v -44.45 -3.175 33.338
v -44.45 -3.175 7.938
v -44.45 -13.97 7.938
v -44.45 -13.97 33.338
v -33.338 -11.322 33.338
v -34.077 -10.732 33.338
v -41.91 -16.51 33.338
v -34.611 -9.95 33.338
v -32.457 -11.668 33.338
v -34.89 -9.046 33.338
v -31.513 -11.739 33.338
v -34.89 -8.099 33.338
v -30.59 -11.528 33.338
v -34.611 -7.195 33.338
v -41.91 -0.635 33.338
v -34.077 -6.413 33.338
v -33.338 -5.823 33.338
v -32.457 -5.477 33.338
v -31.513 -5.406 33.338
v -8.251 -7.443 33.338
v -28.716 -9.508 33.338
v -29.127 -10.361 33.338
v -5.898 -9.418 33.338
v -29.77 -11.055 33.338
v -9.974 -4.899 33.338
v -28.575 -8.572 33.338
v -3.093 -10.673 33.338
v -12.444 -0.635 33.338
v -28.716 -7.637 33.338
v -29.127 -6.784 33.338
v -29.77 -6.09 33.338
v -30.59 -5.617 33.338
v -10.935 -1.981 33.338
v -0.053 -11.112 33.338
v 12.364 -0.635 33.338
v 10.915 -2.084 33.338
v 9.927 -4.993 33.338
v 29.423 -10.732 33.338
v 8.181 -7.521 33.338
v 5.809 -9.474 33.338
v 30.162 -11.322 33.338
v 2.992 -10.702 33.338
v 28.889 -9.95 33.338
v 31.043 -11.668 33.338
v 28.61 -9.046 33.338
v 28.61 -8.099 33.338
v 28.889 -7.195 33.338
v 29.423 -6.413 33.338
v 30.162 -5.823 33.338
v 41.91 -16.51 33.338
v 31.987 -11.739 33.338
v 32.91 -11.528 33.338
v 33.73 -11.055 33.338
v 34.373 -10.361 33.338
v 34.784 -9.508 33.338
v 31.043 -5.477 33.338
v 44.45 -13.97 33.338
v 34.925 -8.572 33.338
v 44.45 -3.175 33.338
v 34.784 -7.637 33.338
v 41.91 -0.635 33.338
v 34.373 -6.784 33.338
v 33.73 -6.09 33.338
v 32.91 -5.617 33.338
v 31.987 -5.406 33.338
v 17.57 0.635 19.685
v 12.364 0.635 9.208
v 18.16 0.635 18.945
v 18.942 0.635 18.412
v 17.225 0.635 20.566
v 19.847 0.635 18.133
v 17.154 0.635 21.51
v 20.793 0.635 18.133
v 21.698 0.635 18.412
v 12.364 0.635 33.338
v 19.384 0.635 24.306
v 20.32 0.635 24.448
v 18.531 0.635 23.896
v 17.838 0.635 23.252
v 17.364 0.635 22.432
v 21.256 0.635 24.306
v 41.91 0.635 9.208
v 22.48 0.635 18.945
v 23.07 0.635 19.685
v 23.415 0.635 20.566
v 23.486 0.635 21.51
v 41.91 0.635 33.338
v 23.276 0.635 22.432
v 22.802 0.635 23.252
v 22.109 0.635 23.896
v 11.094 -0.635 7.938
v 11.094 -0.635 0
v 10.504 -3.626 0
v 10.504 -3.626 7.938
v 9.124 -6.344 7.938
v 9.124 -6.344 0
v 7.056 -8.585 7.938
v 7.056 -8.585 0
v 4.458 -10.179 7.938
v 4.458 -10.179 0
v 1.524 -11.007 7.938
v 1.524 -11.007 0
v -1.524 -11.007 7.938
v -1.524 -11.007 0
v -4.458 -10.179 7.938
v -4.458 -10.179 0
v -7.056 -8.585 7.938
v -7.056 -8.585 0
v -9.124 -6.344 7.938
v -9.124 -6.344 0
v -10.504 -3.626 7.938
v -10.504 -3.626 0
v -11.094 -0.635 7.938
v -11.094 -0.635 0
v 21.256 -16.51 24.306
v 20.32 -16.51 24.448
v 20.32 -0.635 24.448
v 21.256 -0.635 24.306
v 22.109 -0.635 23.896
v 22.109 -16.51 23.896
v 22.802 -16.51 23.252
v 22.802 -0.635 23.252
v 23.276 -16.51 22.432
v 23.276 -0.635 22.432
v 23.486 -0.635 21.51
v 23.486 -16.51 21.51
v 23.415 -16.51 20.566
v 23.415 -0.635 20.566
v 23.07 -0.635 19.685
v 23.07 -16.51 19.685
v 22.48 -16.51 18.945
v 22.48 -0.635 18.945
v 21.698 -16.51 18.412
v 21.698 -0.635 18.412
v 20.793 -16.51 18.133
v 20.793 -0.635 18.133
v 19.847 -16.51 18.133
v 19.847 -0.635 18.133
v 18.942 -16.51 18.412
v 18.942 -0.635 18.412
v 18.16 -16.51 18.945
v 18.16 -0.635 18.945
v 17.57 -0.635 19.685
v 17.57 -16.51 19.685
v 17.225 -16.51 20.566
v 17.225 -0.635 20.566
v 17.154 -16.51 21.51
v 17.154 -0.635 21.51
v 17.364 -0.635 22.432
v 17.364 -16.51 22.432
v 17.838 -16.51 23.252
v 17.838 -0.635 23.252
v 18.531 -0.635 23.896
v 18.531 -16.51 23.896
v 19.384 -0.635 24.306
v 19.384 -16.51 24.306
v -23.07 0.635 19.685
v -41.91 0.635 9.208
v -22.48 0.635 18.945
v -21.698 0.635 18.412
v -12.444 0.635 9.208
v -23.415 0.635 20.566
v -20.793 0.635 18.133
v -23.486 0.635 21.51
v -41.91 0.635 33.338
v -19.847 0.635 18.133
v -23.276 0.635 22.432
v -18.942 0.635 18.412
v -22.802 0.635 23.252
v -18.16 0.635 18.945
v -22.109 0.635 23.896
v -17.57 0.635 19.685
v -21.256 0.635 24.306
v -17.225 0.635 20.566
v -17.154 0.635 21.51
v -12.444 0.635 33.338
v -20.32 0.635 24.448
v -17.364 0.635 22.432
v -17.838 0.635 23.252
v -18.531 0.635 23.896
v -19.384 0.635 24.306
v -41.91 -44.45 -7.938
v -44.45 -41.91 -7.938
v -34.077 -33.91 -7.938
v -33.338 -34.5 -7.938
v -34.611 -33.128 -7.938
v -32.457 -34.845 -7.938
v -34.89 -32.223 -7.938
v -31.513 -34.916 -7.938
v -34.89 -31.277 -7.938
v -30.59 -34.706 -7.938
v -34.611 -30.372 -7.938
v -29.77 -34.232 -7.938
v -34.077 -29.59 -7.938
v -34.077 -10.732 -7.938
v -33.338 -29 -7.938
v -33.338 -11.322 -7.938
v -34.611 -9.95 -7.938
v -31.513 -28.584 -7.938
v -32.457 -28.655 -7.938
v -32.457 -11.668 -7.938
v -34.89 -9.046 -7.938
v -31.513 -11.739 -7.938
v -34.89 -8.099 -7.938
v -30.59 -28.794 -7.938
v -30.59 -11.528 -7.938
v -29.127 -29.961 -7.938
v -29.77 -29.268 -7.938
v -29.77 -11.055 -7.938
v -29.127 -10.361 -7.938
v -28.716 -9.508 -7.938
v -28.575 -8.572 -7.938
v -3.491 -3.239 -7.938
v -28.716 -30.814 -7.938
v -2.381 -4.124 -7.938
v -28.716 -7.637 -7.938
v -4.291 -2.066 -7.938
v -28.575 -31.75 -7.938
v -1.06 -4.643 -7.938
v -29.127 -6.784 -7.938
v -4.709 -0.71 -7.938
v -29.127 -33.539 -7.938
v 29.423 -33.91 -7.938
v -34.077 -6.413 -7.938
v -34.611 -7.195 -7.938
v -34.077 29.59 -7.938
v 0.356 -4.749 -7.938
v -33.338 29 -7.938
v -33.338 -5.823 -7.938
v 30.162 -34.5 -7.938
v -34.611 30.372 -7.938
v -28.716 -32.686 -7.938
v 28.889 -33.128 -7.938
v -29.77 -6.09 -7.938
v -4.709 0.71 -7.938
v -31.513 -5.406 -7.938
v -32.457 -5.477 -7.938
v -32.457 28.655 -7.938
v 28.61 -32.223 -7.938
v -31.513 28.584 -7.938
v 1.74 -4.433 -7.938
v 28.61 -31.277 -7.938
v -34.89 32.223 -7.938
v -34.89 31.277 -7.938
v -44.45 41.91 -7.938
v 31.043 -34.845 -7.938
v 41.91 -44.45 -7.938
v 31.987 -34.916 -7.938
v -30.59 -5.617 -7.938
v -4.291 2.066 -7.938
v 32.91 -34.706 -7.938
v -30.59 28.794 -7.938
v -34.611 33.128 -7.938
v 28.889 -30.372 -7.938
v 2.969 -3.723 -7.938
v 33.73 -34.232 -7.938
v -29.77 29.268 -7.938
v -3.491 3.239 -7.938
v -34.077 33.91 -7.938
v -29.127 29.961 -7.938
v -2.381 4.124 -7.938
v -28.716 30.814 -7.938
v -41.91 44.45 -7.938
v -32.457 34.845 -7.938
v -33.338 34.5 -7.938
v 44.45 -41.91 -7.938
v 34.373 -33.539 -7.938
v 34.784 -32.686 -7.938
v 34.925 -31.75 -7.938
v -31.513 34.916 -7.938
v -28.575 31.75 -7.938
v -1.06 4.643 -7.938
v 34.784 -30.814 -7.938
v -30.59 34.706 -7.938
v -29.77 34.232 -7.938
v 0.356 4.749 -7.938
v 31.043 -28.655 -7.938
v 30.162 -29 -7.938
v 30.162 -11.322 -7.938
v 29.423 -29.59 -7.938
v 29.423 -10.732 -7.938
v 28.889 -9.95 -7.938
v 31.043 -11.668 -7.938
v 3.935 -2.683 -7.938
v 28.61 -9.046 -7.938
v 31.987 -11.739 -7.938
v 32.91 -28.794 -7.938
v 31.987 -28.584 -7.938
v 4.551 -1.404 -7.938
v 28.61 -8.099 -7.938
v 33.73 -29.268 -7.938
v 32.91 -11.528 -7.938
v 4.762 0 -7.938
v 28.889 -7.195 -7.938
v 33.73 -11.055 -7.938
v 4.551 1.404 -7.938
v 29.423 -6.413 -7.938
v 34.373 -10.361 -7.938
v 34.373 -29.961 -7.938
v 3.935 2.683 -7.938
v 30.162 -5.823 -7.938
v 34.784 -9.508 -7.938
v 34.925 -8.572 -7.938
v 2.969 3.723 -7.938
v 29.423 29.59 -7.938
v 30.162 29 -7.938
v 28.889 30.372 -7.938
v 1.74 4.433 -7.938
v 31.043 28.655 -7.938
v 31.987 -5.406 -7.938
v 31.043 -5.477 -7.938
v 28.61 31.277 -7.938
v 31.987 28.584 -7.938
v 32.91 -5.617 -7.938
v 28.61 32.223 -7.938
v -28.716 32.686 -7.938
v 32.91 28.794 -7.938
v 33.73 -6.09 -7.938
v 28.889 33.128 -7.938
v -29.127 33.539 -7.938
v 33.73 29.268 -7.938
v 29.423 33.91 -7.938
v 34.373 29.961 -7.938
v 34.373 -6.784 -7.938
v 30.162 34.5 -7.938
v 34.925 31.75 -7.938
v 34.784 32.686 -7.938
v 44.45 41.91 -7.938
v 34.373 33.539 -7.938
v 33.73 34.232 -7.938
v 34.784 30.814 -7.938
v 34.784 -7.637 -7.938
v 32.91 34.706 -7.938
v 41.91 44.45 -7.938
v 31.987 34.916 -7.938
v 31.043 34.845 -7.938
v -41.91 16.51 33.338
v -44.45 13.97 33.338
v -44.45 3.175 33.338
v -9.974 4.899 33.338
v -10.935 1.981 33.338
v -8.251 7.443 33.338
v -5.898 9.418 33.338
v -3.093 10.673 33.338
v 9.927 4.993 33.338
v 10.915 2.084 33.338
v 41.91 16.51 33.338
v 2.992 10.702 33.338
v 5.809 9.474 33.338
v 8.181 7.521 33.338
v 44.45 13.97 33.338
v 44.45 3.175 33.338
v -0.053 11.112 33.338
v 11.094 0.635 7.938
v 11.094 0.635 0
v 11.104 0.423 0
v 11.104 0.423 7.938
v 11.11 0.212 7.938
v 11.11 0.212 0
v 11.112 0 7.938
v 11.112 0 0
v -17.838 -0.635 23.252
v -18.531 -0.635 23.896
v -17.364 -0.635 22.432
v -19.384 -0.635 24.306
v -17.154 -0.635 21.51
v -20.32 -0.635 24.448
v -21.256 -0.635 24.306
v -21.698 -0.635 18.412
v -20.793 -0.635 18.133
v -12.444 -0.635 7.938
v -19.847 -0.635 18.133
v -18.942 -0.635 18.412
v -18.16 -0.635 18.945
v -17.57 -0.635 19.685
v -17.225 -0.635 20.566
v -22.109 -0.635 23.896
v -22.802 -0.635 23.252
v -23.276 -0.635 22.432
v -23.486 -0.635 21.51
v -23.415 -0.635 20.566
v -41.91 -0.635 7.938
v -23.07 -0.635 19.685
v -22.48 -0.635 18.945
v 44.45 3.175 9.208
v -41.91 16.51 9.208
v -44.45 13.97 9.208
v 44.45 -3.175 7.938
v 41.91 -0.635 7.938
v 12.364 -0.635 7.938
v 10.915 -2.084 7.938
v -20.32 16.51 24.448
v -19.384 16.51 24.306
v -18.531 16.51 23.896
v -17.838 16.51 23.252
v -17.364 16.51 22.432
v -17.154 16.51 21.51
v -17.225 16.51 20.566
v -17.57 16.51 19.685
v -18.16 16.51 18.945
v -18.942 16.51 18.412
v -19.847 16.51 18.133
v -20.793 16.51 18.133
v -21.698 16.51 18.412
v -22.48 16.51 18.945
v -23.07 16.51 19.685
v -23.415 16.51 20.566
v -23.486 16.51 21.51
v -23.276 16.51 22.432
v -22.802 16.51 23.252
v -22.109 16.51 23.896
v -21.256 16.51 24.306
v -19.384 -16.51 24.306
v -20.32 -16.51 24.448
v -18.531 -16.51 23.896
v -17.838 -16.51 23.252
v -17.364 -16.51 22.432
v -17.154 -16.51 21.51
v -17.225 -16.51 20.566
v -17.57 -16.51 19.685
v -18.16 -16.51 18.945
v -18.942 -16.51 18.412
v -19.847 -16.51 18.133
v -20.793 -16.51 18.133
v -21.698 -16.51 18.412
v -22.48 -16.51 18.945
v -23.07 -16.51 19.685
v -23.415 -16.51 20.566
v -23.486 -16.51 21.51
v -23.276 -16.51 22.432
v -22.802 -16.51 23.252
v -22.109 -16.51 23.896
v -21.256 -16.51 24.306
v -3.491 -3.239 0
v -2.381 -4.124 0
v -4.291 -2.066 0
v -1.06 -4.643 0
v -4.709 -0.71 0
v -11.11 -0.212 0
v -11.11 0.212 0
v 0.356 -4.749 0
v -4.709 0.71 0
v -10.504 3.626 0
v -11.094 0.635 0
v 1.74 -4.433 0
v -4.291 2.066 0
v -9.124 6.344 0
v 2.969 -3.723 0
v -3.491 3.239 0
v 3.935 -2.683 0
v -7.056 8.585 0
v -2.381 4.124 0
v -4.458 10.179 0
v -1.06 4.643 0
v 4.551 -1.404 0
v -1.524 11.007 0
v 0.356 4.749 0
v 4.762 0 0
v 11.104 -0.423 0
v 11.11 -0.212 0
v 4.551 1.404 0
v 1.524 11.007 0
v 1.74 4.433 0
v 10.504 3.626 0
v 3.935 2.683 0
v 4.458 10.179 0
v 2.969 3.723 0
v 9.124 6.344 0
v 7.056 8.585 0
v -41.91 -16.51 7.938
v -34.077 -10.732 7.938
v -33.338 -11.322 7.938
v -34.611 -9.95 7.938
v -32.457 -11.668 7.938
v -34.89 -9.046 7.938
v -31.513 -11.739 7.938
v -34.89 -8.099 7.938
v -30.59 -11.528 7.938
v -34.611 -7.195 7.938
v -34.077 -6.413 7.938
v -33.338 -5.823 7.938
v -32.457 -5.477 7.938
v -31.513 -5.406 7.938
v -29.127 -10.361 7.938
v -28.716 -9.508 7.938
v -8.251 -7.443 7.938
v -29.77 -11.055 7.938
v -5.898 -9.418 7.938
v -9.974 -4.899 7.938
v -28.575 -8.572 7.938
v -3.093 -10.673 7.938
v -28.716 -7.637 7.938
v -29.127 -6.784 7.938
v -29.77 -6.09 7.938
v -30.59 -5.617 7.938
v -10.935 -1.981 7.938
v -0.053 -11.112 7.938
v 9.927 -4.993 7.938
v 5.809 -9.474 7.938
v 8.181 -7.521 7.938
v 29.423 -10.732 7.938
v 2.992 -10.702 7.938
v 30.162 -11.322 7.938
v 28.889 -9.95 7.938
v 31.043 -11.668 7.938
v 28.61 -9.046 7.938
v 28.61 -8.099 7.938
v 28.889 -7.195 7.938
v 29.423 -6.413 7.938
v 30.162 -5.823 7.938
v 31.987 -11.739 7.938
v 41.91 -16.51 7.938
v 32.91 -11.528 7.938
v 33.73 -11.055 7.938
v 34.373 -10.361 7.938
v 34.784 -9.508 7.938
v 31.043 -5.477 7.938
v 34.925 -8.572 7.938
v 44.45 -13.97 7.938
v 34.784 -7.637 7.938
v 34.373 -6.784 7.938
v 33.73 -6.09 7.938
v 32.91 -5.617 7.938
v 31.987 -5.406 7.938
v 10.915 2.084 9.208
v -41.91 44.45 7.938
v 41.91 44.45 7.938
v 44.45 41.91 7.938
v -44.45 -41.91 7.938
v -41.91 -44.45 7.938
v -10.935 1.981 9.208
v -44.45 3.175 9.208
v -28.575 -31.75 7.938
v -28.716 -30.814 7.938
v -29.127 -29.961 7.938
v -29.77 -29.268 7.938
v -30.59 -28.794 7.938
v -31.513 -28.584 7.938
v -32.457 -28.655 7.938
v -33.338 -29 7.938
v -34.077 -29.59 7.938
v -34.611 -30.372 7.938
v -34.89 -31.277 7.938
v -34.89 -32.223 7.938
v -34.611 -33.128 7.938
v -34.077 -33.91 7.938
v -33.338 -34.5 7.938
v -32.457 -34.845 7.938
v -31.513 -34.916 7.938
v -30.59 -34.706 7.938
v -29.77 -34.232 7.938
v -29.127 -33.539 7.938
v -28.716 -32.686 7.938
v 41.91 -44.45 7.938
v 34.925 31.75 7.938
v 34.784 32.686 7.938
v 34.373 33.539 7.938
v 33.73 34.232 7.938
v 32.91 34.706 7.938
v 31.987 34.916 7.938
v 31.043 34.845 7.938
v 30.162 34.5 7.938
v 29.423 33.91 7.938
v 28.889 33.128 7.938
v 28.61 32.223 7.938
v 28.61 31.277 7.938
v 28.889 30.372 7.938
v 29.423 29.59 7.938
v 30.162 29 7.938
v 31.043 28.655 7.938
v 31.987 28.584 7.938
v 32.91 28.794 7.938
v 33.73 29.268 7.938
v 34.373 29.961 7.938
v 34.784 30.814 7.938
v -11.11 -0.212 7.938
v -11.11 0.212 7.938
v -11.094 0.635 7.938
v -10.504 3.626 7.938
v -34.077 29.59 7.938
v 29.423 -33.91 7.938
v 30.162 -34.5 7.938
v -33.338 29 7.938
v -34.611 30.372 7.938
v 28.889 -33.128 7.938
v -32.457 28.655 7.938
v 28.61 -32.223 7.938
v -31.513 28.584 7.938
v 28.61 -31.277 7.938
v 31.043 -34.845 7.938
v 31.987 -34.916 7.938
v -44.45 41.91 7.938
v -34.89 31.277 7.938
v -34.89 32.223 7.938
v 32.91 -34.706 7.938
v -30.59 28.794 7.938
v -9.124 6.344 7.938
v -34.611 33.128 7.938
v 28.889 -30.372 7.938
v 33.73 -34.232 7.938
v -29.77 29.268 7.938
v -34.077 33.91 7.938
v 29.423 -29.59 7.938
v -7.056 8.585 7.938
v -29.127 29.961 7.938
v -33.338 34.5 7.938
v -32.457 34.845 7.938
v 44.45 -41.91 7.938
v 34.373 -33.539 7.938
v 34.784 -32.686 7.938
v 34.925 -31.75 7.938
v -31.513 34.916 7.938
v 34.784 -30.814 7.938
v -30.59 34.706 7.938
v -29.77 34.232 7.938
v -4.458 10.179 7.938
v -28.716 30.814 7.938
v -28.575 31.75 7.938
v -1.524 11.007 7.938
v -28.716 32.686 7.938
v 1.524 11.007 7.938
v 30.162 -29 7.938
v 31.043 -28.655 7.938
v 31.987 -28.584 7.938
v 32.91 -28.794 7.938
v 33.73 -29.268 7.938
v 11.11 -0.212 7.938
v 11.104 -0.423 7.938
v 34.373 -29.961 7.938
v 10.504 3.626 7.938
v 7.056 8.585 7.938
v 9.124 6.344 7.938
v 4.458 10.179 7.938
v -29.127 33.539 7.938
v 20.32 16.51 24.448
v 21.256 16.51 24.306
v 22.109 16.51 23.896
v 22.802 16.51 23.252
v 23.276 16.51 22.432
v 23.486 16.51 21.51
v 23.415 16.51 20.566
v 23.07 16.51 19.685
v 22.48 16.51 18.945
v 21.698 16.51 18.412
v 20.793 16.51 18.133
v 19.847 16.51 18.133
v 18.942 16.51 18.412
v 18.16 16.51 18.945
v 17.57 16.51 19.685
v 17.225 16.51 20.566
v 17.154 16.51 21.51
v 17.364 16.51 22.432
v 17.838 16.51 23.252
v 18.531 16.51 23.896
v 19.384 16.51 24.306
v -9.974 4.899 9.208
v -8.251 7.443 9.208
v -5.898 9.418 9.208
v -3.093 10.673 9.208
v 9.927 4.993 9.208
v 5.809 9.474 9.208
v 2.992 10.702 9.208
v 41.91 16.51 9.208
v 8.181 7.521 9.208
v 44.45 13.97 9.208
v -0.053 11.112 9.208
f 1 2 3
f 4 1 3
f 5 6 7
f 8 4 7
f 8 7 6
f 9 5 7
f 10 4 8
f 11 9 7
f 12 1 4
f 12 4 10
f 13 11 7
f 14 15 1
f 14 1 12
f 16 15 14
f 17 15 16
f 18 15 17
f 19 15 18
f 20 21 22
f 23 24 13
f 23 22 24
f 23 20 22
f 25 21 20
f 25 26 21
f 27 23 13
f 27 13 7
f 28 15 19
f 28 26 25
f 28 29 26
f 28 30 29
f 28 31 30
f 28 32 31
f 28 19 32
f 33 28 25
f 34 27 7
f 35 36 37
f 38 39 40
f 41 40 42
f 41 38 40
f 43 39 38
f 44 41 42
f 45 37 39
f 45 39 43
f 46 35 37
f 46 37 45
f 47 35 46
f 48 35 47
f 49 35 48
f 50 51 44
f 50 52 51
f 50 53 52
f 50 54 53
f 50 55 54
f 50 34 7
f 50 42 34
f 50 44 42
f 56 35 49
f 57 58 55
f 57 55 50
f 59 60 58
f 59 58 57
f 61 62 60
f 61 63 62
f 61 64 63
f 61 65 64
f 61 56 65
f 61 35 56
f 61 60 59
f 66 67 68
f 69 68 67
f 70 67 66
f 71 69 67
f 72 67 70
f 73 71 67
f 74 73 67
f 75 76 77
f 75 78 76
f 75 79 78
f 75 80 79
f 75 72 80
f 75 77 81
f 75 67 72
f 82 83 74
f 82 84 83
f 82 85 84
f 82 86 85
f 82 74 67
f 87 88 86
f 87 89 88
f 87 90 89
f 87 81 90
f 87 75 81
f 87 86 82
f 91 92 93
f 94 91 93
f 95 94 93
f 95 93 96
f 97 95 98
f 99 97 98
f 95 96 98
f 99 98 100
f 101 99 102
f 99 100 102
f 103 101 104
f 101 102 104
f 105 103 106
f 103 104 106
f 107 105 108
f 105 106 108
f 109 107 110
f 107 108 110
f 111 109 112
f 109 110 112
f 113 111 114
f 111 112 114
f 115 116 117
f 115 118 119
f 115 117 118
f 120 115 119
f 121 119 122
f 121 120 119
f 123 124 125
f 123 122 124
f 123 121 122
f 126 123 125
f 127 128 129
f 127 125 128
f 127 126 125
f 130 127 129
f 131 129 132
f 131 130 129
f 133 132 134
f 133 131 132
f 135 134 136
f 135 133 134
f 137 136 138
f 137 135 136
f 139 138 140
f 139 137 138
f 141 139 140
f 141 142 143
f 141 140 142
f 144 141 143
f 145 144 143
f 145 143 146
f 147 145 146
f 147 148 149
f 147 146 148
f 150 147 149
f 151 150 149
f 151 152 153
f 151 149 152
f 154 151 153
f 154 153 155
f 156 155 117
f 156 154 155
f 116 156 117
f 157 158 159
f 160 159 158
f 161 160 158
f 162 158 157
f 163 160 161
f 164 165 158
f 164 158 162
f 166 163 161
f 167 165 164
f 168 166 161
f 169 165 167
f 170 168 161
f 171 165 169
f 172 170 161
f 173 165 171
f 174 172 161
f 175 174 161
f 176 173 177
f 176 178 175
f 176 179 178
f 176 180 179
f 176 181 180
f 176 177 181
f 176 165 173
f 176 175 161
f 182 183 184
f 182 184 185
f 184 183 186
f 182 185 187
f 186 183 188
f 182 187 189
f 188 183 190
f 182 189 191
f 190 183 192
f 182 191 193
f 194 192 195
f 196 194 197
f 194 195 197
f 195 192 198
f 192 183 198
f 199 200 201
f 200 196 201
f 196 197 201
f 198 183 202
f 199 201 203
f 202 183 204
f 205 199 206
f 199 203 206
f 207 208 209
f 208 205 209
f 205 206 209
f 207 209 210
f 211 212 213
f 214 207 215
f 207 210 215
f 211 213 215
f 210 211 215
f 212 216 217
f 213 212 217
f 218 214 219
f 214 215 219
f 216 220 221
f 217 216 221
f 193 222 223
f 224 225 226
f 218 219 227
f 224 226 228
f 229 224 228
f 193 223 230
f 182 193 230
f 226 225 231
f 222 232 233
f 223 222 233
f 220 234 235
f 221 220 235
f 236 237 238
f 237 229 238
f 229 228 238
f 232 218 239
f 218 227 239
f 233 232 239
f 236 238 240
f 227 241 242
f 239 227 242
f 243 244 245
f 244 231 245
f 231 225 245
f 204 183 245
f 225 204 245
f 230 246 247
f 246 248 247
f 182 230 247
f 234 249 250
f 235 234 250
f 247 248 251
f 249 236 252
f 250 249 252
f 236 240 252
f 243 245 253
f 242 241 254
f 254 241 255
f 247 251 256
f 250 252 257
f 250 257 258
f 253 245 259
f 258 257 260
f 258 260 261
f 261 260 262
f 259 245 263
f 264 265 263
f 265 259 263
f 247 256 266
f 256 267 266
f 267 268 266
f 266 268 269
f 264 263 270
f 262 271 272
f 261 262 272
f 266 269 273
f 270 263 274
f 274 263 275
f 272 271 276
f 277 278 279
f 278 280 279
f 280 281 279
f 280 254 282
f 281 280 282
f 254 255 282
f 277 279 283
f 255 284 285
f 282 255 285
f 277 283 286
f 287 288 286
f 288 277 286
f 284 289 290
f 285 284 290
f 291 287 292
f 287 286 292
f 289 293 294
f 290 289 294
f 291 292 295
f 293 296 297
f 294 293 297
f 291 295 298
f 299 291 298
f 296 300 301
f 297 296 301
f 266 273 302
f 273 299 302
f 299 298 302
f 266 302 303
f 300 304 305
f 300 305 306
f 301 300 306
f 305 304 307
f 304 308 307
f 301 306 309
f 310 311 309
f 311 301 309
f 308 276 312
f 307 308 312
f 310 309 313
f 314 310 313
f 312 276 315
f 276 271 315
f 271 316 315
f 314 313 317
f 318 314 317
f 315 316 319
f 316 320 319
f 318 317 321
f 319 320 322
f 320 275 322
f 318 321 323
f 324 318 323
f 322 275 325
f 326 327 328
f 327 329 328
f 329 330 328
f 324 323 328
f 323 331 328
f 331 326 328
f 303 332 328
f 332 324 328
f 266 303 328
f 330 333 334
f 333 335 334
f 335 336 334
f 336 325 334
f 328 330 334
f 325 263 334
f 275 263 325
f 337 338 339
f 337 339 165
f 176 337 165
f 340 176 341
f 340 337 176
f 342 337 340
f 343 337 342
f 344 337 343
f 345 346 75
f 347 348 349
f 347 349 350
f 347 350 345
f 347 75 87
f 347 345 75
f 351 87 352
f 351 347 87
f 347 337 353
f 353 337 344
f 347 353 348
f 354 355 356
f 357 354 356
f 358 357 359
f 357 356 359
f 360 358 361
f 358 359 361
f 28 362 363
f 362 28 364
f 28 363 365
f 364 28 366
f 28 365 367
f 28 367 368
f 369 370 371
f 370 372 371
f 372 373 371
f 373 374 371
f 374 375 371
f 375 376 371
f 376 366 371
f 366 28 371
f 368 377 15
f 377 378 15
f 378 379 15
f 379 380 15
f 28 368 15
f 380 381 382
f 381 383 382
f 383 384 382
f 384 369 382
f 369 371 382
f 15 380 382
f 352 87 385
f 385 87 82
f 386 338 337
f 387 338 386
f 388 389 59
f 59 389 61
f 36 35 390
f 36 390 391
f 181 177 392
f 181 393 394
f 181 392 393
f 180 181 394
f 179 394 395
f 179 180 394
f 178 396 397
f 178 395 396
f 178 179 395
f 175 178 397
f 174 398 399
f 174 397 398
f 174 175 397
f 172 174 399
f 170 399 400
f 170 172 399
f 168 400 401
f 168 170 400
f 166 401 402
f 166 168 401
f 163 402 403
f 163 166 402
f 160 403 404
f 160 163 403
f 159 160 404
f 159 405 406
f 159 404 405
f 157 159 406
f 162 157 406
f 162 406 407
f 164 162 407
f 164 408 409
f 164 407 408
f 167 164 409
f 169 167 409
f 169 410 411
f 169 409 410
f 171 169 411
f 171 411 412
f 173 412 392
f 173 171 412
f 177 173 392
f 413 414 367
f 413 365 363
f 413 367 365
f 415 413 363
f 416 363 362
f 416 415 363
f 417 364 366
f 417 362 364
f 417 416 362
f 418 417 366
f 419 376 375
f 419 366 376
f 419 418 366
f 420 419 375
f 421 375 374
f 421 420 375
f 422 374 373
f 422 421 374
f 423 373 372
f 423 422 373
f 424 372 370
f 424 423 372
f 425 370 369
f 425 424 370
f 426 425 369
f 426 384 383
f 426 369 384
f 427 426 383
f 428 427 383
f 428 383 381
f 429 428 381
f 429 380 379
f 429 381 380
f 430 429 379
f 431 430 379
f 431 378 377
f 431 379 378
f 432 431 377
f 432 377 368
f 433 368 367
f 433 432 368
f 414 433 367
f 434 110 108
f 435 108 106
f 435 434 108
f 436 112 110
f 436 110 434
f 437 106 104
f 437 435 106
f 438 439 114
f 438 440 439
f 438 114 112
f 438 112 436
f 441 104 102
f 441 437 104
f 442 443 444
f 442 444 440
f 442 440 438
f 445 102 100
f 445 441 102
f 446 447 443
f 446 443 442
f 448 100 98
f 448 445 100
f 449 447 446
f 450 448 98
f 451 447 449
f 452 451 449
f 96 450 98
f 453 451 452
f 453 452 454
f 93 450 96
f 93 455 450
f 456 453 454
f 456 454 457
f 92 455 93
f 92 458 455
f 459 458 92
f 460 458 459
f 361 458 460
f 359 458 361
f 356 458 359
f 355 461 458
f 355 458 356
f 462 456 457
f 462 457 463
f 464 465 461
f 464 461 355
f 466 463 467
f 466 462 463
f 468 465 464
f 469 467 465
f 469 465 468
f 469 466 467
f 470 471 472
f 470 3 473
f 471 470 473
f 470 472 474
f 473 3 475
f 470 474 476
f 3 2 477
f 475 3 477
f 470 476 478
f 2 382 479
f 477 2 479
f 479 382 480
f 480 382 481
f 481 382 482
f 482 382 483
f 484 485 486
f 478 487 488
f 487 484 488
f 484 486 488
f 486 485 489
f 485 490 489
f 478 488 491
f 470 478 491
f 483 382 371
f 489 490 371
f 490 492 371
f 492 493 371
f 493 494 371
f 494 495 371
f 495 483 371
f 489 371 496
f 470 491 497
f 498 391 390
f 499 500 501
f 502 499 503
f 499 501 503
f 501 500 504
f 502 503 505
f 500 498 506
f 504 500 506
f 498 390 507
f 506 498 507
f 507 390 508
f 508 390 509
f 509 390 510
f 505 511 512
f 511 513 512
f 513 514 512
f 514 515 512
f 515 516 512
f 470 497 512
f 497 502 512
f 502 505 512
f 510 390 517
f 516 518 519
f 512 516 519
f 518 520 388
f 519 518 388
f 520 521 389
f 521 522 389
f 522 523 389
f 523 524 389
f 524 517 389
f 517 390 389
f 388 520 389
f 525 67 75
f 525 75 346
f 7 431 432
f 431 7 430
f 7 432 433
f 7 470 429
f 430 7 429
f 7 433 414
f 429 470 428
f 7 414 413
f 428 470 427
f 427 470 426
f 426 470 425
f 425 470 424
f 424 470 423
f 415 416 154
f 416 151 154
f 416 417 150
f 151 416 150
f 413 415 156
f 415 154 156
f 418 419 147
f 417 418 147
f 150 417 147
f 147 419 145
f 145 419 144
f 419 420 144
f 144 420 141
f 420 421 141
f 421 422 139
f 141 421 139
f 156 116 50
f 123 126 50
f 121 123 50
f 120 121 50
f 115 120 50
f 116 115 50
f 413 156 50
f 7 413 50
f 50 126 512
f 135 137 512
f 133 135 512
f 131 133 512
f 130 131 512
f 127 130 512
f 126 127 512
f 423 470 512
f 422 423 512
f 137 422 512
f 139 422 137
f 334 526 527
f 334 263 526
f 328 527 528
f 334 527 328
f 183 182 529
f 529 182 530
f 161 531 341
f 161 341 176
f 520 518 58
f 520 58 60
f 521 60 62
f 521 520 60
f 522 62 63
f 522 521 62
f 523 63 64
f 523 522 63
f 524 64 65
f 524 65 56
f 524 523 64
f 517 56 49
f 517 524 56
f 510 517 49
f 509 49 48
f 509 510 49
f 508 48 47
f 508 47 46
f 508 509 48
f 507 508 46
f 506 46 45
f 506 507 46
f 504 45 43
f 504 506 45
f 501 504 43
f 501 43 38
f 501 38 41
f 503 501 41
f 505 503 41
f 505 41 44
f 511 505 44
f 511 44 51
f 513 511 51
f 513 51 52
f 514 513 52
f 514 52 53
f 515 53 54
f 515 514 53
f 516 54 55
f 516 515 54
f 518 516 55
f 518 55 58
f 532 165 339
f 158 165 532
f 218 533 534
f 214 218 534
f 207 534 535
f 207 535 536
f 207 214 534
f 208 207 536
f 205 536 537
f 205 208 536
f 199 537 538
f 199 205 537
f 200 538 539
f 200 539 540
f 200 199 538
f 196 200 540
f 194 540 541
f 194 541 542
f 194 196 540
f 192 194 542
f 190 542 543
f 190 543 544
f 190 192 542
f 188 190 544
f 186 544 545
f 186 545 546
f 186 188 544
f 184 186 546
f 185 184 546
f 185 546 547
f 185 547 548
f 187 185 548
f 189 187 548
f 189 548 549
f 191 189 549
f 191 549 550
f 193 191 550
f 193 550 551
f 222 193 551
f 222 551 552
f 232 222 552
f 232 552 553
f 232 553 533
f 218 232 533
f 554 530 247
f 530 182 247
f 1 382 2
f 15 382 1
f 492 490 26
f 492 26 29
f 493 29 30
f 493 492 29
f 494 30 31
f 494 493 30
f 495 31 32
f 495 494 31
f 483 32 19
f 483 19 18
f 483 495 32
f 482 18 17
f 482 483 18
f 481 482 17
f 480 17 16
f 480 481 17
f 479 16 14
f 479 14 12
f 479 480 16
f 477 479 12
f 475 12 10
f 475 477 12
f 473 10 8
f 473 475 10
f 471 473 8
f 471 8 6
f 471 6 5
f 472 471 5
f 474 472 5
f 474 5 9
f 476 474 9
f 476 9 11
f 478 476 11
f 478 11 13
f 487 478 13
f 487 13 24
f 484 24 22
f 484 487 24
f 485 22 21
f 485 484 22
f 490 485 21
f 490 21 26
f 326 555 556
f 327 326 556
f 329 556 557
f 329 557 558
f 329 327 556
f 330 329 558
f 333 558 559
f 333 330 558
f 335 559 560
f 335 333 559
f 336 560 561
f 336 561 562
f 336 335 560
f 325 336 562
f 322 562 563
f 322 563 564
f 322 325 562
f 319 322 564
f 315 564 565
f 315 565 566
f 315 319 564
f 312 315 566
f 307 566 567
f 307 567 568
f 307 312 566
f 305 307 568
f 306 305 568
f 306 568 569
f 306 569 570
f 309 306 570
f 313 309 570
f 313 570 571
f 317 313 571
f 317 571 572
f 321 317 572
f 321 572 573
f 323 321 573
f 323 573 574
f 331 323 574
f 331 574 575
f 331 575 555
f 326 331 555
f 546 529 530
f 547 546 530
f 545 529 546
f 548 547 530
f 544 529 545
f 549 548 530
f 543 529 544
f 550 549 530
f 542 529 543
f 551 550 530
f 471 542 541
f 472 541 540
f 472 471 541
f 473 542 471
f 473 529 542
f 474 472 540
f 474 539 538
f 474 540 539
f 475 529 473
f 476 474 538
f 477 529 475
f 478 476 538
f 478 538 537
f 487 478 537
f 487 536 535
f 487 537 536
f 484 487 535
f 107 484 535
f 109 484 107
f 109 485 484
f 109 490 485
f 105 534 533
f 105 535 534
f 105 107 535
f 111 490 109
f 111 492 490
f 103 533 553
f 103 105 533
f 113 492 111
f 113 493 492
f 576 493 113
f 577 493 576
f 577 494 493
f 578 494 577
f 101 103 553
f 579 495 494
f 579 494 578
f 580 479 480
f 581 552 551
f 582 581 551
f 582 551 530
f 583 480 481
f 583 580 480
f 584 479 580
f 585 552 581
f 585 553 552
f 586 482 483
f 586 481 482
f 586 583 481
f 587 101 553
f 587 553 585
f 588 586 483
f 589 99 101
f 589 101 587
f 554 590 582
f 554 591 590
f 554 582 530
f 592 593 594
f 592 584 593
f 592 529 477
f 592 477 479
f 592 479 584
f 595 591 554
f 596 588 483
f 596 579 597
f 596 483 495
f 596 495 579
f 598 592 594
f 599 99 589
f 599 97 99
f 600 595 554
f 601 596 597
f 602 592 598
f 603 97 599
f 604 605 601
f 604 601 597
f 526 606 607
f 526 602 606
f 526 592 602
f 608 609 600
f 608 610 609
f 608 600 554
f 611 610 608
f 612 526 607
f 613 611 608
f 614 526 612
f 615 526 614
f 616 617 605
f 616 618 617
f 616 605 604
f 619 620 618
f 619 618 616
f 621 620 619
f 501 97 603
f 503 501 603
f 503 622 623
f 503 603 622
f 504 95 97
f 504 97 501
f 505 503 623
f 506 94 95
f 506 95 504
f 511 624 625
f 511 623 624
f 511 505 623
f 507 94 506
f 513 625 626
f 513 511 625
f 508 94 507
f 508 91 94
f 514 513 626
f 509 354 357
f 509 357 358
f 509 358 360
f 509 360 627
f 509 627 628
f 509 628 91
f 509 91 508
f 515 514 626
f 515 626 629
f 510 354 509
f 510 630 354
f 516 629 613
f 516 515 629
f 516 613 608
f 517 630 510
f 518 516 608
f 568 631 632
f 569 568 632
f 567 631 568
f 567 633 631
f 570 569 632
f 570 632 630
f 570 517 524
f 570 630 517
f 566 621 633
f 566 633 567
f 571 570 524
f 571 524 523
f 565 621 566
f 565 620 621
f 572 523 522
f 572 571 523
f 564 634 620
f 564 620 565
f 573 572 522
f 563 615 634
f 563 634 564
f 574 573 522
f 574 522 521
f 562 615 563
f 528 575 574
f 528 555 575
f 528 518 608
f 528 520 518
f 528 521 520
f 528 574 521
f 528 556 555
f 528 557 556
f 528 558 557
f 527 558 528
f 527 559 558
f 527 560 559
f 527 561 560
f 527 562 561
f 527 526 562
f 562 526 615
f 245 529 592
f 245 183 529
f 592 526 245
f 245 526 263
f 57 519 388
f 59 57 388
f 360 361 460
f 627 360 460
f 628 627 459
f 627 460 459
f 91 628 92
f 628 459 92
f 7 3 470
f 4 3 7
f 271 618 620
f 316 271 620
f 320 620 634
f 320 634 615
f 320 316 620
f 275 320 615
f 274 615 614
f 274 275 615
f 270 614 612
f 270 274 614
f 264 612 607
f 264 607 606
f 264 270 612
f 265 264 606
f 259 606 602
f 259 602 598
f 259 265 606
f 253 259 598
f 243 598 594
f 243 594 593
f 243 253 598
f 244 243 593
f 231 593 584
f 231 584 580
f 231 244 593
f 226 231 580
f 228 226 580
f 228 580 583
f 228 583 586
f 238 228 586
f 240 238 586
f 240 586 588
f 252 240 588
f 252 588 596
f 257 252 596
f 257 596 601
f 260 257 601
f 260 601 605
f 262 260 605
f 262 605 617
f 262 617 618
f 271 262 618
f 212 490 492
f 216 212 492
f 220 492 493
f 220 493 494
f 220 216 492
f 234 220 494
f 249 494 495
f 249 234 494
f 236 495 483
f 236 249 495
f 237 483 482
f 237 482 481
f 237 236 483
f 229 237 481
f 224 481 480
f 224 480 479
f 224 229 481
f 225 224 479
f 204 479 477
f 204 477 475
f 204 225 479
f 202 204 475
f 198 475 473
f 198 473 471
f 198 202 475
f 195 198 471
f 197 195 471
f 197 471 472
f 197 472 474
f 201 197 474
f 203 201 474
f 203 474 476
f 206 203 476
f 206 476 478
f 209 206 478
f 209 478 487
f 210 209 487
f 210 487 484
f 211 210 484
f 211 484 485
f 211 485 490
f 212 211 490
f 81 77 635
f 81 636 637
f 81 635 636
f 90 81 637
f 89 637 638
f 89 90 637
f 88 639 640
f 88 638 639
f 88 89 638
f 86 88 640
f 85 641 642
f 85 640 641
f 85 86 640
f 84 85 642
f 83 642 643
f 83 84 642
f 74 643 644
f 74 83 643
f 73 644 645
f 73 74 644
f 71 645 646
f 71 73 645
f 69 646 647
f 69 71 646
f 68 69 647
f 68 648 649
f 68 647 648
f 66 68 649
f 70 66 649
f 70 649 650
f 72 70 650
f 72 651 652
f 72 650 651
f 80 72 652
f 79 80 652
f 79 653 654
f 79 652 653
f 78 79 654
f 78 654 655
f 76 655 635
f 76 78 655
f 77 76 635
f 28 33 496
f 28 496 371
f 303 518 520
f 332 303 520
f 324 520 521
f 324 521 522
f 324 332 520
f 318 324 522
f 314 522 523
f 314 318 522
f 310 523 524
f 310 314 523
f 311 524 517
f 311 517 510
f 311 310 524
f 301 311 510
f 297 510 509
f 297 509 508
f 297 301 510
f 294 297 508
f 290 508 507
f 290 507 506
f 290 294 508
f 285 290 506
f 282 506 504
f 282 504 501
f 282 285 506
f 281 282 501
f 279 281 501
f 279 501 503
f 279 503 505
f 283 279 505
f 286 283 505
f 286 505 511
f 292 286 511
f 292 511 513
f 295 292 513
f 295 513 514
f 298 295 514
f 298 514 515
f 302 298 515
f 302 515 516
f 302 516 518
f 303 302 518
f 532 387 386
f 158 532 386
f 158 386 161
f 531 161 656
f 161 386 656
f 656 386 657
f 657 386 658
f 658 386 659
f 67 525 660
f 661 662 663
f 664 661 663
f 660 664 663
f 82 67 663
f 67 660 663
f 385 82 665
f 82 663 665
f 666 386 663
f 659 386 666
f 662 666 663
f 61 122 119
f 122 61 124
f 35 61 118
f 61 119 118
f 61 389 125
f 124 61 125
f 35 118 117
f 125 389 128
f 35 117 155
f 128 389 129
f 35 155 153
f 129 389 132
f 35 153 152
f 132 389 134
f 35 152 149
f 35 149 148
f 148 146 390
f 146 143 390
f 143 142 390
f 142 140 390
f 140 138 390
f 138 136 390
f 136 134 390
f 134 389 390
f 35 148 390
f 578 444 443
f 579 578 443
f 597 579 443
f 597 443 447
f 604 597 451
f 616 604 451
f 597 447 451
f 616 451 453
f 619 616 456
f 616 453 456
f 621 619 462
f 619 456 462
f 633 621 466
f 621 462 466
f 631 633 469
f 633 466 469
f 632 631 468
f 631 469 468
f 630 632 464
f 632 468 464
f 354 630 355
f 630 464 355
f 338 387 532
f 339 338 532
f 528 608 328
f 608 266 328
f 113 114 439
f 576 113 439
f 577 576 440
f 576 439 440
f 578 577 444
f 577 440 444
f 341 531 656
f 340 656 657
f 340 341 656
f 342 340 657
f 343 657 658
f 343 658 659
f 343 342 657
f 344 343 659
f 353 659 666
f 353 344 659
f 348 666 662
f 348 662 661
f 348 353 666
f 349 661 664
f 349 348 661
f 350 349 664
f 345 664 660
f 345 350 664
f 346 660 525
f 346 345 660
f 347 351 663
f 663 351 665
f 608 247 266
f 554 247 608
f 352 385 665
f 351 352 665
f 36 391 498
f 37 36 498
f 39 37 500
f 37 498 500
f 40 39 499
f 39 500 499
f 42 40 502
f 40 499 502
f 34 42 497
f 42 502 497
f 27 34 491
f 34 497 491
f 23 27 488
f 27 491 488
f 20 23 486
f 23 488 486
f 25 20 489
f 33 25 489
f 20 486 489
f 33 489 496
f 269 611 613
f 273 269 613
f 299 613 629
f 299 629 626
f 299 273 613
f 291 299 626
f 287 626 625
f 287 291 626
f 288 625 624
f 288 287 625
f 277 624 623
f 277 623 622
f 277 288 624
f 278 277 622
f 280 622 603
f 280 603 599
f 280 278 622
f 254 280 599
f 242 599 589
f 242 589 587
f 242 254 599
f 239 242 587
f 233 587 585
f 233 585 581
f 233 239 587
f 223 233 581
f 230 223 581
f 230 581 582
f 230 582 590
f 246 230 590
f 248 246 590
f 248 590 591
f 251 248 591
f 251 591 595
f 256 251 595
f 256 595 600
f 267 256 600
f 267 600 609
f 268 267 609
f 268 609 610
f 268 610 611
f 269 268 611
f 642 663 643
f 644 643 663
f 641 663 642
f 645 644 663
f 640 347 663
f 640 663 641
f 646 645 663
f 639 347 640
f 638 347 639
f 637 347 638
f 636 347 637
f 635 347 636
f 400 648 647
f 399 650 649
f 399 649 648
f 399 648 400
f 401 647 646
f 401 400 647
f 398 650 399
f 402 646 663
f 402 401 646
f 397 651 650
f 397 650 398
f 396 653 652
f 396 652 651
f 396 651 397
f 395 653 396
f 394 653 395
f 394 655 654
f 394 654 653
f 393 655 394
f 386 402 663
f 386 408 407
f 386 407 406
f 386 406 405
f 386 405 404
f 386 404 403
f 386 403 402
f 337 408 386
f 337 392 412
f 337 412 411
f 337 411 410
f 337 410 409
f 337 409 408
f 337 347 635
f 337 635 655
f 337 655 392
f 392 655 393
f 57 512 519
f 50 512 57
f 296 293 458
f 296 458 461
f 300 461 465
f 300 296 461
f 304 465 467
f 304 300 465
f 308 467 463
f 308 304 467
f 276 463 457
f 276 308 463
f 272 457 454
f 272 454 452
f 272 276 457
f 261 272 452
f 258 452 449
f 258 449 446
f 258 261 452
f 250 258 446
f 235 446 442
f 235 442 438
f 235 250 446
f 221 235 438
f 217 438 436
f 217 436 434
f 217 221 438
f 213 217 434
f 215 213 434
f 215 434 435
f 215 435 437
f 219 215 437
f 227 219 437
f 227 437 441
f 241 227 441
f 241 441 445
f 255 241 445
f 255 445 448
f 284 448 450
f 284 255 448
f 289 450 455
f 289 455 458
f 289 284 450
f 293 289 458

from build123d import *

# Parameters (mm, degrees)
SKETCH1_W               = 88.9
SKETCH1_H               = 27.94
SKETCH1_R               = 3.175
BOSS_EXTRUDE1_DEPTH     = 7.9375
BOSS_EXTRUDE2_START     = 7.9375
SKETCH1_3_R             = 3.175
BOSS_EXTRUDE2_DEPTH     = 25.4
BOSS_EXTRUDE3_START     = 33.3375
BOSS_EXTRUDE3_DEPTH     = 24.13
CUT_EXTRUDE1_DEPTH      = 72.154718088
CUT_EXTRUDE1_DEPTH_BACK = 72.154718088
SKETCH2_R               = 3.175
BOSS_EXTRUDE4_START     = -7.9375
SKETCH1_5_W             = 88.9
SKETCH1_5_H             = 88.9
SKETCH1_5_R             = 3.175
SKETCH1_5_R_2           = 4.7625
BOSS_EXTRUDE4_DEPTH     = 7.9375
CHAMFER1_SIZE           = 2.54
CHAMFER2_SIZE           = 2.54
CHAMFER3_SIZE           = 2.54
CHAMFER4_SIZE           = 1.349308072
CHAMFER4_SIZE_2         = 1.27
CHAMFER5_SIZE           = 1.349308072
CHAMFER5_SIZE_2         = 1.27


with BuildPart() as part:
    # Sketch1 → Boss-Extrude1 (new body)
    # profile 1 of 6: a face of its own
    with BuildSketch(Plane.XY):
        with Locations((0, 30.48)):
            Rectangle(SKETCH1_W, SKETCH1_H)
        with Locations((-31.75, 31.75)):
            Circle(SKETCH1_R, mode=Mode.SUBTRACT)
        with Locations((31.75, 31.75)):
            Circle(SKETCH1_R, mode=Mode.SUBTRACT)
    # profile 2 of 6: a face of its own
    with BuildSketch(Plane.XY):
        with BuildLine():
            Line((44.45, 16.51), (-44.45, 16.51))
            Line((-44.45, 16.51), (-44.45, 0.635))
            Line((-44.45, 0.635), (-11.094342308, 0.635))
            ThreePointArc((-11.094342308, 0.635), (0, 11.1125), (11.094342308, 0.635))
            Line((11.094342308, 0.635), (44.45, 0.635))
            Line((44.45, 0.635), (44.45, 16.51))
        make_face()
    # profile 3 of 6: a face of its own
    with BuildSketch(Plane.XY):
        with BuildLine():
            Line((44.45, -16.51), (44.45, -0.635))
            Line((44.45, -0.635), (11.094342308, -0.635))
            ThreePointArc((11.094342308, -0.635), (0, -11.1125), (-11.094342308, -0.635))
            Line((-11.094342308, -0.635), (-44.45, -0.635))
            Line((-44.45, -0.635), (-44.45, -16.51))
            Line((-44.45, -16.51), (44.45, -16.51))
        make_face()
        with Locations((-31.75, -8.5725)):
            Circle(SKETCH1_R, mode=Mode.SUBTRACT)
        with Locations((31.75, -8.5725)):
            Circle(SKETCH1_R, mode=Mode.SUBTRACT)
    # profile 4 of 6: a face of its own
    with BuildSketch(Plane.XY):
        with Locations((0, -30.48)):
            Rectangle(SKETCH1_W, SKETCH1_H)
        with Locations((-31.75, -31.75)):
            Circle(SKETCH1_R, mode=Mode.SUBTRACT)
        with Locations((31.75, -31.75)):
            Circle(SKETCH1_R, mode=Mode.SUBTRACT)
    # profile 5 of 6: a face of its own
    with BuildSketch(Plane.XY):
        with BuildLine():
            Line((-11.094342308, 0.635), (-44.45, 0.635))
            Line((-44.45, 0.635), (-44.45, 0))
            Line((-44.45, 0), (-44.45, -0.635))
            Line((-44.45, -0.635), (-11.094342308, -0.635))
            ThreePointArc((-11.094342308, -0.635), (-11.1125, 0), (-11.094342308, 0.635))
        make_face()
    # profile 6 of 6: a face of its own
    with BuildSketch(Plane.XY):
        with BuildLine():
            Line((44.45, -0.635), (44.45, 0.635))
            Line((44.45, 0.635), (11.094342308, 0.635))
            ThreePointArc((11.094342308, 0.635), (11.107959649, 0.317629777), (11.1125, 0))
            ThreePointArc((11.1125, 0), (11.107959649, -0.317629777), (11.094342308, -0.635))
            Line((11.094342308, -0.635), (44.45, -0.635))
        make_face()
    extrude(amount=BOSS_EXTRUDE1_DEPTH)

    # Sketch1<5> → Boss-Extrude4 (add)
    with BuildSketch(Plane.XY.offset(BOSS_EXTRUDE4_START)):
        Rectangle(SKETCH1_5_W, SKETCH1_5_H)
        with Locations((-31.75, 31.75)):
            Circle(SKETCH1_5_R, mode=Mode.SUBTRACT)
        with Locations((31.75, 31.75)):
            Circle(SKETCH1_5_R, mode=Mode.SUBTRACT)
        Circle(SKETCH1_5_R_2, mode=Mode.SUBTRACT)
        with Locations((31.75, -8.5725)):
            Circle(SKETCH1_5_R, mode=Mode.SUBTRACT)
        with Locations((-31.75, -8.5725)):
            Circle(SKETCH1_5_R, mode=Mode.SUBTRACT)
        with Locations((31.75, -31.75)):
            Circle(SKETCH1_5_R, mode=Mode.SUBTRACT)
        with Locations((-31.75, -31.75)):
            Circle(SKETCH1_5_R, mode=Mode.SUBTRACT)
    extrude(amount=BOSS_EXTRUDE4_DEPTH)

    # Chamfer1
    chamfer1_edges = [part.edges().sort_by_distance(p)[0] for p in [
        (-44.45, -44.45, 0),
        (-44.45, 44.45, 0),
        (44.45, 44.45, 0),
        (44.45, -44.45, 0),
    ]]
    chamfer(chamfer1_edges, length=CHAMFER1_SIZE)


with BuildPart() as body_2:
    # Sketch1<3> → Boss-Extrude2 (new body)
    with BuildSketch(Plane.XY.offset(BOSS_EXTRUDE2_START)):
        with BuildLine():
            Line((44.45, -16.51), (44.45, -0.635))
            Line((44.45, -0.635), (11.094342308, -0.635))
            ThreePointArc((11.094342308, -0.635), (0, -11.1125), (-11.094342308, -0.635))
            Line((-11.094342308, -0.635), (-44.45, -0.635))
            Line((-44.45, -0.635), (-44.45, -16.51))
            Line((-44.45, -16.51), (44.45, -16.51))
        make_face()
        with Locations((-31.75, -8.5725)):
            Circle(SKETCH1_3_R, mode=Mode.SUBTRACT)
        with Locations((31.75, -8.5725)):
            Circle(SKETCH1_3_R, mode=Mode.SUBTRACT)
    extrude(amount=BOSS_EXTRUDE2_DEPTH)


with BuildPart() as body_3:
    # Sketch1<4> → Boss-Extrude3 (new body)
    with BuildSketch(Plane.XY.offset(BOSS_EXTRUDE3_START)):
        with BuildLine():
            Line((44.45, 16.51), (-44.45, 16.51))
            Line((-44.45, 16.51), (-44.45, 0.635))
            Line((-44.45, 0.635), (-11.094342308, 0.635))
            ThreePointArc((-11.094342308, 0.635), (0, 11.1125), (11.094342308, 0.635))
            Line((11.094342308, 0.635), (44.45, 0.635))
            Line((44.45, 0.635), (44.45, 16.51))
        make_face()
    extrude(amount=-BOSS_EXTRUDE3_DEPTH)


with BuildPart() as cut_extrude1_tool:
    # Sketch2 → Cut-Extrude1 (new, two sides: drawn at the far end of the back side and taken through both)
    with BuildSketch(Plane(origin=(0, 0, 0), x_dir=(1, 0, 0), z_dir=(0, 1, 0)).offset(-CUT_EXTRUDE1_DEPTH_BACK)):
        with Locations(Location((20.32, -21.2725, 0), (0, 0, 270))):
            Circle(SKETCH2_R)
        with Locations(Location((-20.32, -21.2725, 0), (0, 0, 270))):
            Circle(SKETCH2_R)
    extrude(amount=CUT_EXTRUDE1_DEPTH + CUT_EXTRUDE1_DEPTH_BACK)


with BuildPart() as body_2_1:
    add(body_2.part)

    # Cut-Extrude1: cut by cut_extrude1_tool
    add(cut_extrude1_tool.part, mode=Mode.SUBTRACT)

    # Chamfer2
    chamfer2_edges = [body_2_1.edges().sort_by_distance(p)[0] for p in [
        (44.45, -16.51, 20.6375),
        (-44.45, -16.51, 20.6375),
        (-44.45, -0.635, 20.6375),
        (44.45, -0.635, 20.6375),
    ]]
    chamfer(chamfer2_edges, length=CHAMFER2_SIZE)

    # Chamfer4
    # the kernel refuses this chamfer: 1.349308072, 1.27 mm, written as the material it takes off along each edge
    with BuildSketch(Plane(origin=(-11.094342308, -0.635, 4.44742728), x_dir=(0.11791105976871491, -0.9930241598189938, 0), z_dir=(0, 0, 1))) as chamfer4_piece_1:
        with BuildLine():
            Line((1.355150635, 0), (-CHAMFER4_SIZE * 0.117911059734, -CHAMFER4_SIZE * 0.993024159525))
            Line((-CHAMFER4_SIZE * 0.117911059734, -CHAMFER4_SIZE * 0.993024159525), (0, 0))
            ThreePointArc((0, 0), (0.697855763, -0.020658022), (1.355150635, 0))
        make_face()
    extrude(amount=32.38014544, mode=Mode.SUBTRACT)
    with BuildSketch(Plane(origin=(11.094342308, -0.635, 4.180143516), x_dir=(1, 0, 0), z_dir=(0, 0, 1))) as chamfer4_piece_2:
        with BuildLine():
            Line((CHAMFER4_SIZE_2, 0), (-0.179005517, -1.449005517))
            ThreePointArc((-0.179005517, -1.449005517), (-0.068318427, -0.748637825), (0, 0))
            Line((0, 0), (CHAMFER4_SIZE_2, 0))
        make_face()
    extrude(amount=32.914712968, mode=Mode.SUBTRACT)


with BuildPart() as body_3_1:
    add(body_3.part)

    # Cut-Extrude1: cut by cut_extrude1_tool
    add(cut_extrude1_tool.part, mode=Mode.SUBTRACT)

    # Chamfer3
    chamfer3_edges = [body_3_1.edges().sort_by_distance(p)[0] for p in [
        (-44.45, 0.635, 21.2725),
        (44.45, 0.635, 21.2725),
        (44.45, 16.51, 21.2725),
        (-44.45, 16.51, 21.2725),
    ]]
    chamfer(chamfer3_edges, length=CHAMFER3_SIZE)

    # Chamfer5
    # the kernel refuses this chamfer: 1.349308072, 1.27 mm, written as the material it takes off along each edge
    with BuildSketch(Plane(origin=(-11.094342308, 0.635, 36.82757272), x_dir=(0.11791105976871363, 0.993024159818994, 0), z_dir=(0, 0, -1))) as chamfer5_piece_1:
        with BuildLine():
            Line((1.355150635, 0), (-CHAMFER5_SIZE * 0.117911059734, -CHAMFER5_SIZE * 0.993024159525))
            Line((-CHAMFER5_SIZE * 0.117911059734, -CHAMFER5_SIZE * 0.993024159525), (0, 0))
            ThreePointArc((0, 0), (0.697855763, -0.020658022), (1.355150635, 0))
        make_face()
    extrude(amount=31.11014544, mode=Mode.SUBTRACT)
    with BuildSketch(Plane(origin=(11.094342308, 0.635, 37.094856484), x_dir=(1, 0, 0), z_dir=(0, 0, -1))) as chamfer5_piece_2:
        with BuildLine():
            Line((CHAMFER5_SIZE_2, 0), (-0.179005517, -1.449005517))
            ThreePointArc((-0.179005517, -1.449005517), (-0.068318427, -0.748637825), (0, 0))
            Line((0, 0), (CHAMFER5_SIZE_2, 0))
        make_face()
    extrude(amount=31.644712968, mode=Mode.SUBTRACT)


solid = Compound([part.part, body_2_1.part, body_3_1.part])
